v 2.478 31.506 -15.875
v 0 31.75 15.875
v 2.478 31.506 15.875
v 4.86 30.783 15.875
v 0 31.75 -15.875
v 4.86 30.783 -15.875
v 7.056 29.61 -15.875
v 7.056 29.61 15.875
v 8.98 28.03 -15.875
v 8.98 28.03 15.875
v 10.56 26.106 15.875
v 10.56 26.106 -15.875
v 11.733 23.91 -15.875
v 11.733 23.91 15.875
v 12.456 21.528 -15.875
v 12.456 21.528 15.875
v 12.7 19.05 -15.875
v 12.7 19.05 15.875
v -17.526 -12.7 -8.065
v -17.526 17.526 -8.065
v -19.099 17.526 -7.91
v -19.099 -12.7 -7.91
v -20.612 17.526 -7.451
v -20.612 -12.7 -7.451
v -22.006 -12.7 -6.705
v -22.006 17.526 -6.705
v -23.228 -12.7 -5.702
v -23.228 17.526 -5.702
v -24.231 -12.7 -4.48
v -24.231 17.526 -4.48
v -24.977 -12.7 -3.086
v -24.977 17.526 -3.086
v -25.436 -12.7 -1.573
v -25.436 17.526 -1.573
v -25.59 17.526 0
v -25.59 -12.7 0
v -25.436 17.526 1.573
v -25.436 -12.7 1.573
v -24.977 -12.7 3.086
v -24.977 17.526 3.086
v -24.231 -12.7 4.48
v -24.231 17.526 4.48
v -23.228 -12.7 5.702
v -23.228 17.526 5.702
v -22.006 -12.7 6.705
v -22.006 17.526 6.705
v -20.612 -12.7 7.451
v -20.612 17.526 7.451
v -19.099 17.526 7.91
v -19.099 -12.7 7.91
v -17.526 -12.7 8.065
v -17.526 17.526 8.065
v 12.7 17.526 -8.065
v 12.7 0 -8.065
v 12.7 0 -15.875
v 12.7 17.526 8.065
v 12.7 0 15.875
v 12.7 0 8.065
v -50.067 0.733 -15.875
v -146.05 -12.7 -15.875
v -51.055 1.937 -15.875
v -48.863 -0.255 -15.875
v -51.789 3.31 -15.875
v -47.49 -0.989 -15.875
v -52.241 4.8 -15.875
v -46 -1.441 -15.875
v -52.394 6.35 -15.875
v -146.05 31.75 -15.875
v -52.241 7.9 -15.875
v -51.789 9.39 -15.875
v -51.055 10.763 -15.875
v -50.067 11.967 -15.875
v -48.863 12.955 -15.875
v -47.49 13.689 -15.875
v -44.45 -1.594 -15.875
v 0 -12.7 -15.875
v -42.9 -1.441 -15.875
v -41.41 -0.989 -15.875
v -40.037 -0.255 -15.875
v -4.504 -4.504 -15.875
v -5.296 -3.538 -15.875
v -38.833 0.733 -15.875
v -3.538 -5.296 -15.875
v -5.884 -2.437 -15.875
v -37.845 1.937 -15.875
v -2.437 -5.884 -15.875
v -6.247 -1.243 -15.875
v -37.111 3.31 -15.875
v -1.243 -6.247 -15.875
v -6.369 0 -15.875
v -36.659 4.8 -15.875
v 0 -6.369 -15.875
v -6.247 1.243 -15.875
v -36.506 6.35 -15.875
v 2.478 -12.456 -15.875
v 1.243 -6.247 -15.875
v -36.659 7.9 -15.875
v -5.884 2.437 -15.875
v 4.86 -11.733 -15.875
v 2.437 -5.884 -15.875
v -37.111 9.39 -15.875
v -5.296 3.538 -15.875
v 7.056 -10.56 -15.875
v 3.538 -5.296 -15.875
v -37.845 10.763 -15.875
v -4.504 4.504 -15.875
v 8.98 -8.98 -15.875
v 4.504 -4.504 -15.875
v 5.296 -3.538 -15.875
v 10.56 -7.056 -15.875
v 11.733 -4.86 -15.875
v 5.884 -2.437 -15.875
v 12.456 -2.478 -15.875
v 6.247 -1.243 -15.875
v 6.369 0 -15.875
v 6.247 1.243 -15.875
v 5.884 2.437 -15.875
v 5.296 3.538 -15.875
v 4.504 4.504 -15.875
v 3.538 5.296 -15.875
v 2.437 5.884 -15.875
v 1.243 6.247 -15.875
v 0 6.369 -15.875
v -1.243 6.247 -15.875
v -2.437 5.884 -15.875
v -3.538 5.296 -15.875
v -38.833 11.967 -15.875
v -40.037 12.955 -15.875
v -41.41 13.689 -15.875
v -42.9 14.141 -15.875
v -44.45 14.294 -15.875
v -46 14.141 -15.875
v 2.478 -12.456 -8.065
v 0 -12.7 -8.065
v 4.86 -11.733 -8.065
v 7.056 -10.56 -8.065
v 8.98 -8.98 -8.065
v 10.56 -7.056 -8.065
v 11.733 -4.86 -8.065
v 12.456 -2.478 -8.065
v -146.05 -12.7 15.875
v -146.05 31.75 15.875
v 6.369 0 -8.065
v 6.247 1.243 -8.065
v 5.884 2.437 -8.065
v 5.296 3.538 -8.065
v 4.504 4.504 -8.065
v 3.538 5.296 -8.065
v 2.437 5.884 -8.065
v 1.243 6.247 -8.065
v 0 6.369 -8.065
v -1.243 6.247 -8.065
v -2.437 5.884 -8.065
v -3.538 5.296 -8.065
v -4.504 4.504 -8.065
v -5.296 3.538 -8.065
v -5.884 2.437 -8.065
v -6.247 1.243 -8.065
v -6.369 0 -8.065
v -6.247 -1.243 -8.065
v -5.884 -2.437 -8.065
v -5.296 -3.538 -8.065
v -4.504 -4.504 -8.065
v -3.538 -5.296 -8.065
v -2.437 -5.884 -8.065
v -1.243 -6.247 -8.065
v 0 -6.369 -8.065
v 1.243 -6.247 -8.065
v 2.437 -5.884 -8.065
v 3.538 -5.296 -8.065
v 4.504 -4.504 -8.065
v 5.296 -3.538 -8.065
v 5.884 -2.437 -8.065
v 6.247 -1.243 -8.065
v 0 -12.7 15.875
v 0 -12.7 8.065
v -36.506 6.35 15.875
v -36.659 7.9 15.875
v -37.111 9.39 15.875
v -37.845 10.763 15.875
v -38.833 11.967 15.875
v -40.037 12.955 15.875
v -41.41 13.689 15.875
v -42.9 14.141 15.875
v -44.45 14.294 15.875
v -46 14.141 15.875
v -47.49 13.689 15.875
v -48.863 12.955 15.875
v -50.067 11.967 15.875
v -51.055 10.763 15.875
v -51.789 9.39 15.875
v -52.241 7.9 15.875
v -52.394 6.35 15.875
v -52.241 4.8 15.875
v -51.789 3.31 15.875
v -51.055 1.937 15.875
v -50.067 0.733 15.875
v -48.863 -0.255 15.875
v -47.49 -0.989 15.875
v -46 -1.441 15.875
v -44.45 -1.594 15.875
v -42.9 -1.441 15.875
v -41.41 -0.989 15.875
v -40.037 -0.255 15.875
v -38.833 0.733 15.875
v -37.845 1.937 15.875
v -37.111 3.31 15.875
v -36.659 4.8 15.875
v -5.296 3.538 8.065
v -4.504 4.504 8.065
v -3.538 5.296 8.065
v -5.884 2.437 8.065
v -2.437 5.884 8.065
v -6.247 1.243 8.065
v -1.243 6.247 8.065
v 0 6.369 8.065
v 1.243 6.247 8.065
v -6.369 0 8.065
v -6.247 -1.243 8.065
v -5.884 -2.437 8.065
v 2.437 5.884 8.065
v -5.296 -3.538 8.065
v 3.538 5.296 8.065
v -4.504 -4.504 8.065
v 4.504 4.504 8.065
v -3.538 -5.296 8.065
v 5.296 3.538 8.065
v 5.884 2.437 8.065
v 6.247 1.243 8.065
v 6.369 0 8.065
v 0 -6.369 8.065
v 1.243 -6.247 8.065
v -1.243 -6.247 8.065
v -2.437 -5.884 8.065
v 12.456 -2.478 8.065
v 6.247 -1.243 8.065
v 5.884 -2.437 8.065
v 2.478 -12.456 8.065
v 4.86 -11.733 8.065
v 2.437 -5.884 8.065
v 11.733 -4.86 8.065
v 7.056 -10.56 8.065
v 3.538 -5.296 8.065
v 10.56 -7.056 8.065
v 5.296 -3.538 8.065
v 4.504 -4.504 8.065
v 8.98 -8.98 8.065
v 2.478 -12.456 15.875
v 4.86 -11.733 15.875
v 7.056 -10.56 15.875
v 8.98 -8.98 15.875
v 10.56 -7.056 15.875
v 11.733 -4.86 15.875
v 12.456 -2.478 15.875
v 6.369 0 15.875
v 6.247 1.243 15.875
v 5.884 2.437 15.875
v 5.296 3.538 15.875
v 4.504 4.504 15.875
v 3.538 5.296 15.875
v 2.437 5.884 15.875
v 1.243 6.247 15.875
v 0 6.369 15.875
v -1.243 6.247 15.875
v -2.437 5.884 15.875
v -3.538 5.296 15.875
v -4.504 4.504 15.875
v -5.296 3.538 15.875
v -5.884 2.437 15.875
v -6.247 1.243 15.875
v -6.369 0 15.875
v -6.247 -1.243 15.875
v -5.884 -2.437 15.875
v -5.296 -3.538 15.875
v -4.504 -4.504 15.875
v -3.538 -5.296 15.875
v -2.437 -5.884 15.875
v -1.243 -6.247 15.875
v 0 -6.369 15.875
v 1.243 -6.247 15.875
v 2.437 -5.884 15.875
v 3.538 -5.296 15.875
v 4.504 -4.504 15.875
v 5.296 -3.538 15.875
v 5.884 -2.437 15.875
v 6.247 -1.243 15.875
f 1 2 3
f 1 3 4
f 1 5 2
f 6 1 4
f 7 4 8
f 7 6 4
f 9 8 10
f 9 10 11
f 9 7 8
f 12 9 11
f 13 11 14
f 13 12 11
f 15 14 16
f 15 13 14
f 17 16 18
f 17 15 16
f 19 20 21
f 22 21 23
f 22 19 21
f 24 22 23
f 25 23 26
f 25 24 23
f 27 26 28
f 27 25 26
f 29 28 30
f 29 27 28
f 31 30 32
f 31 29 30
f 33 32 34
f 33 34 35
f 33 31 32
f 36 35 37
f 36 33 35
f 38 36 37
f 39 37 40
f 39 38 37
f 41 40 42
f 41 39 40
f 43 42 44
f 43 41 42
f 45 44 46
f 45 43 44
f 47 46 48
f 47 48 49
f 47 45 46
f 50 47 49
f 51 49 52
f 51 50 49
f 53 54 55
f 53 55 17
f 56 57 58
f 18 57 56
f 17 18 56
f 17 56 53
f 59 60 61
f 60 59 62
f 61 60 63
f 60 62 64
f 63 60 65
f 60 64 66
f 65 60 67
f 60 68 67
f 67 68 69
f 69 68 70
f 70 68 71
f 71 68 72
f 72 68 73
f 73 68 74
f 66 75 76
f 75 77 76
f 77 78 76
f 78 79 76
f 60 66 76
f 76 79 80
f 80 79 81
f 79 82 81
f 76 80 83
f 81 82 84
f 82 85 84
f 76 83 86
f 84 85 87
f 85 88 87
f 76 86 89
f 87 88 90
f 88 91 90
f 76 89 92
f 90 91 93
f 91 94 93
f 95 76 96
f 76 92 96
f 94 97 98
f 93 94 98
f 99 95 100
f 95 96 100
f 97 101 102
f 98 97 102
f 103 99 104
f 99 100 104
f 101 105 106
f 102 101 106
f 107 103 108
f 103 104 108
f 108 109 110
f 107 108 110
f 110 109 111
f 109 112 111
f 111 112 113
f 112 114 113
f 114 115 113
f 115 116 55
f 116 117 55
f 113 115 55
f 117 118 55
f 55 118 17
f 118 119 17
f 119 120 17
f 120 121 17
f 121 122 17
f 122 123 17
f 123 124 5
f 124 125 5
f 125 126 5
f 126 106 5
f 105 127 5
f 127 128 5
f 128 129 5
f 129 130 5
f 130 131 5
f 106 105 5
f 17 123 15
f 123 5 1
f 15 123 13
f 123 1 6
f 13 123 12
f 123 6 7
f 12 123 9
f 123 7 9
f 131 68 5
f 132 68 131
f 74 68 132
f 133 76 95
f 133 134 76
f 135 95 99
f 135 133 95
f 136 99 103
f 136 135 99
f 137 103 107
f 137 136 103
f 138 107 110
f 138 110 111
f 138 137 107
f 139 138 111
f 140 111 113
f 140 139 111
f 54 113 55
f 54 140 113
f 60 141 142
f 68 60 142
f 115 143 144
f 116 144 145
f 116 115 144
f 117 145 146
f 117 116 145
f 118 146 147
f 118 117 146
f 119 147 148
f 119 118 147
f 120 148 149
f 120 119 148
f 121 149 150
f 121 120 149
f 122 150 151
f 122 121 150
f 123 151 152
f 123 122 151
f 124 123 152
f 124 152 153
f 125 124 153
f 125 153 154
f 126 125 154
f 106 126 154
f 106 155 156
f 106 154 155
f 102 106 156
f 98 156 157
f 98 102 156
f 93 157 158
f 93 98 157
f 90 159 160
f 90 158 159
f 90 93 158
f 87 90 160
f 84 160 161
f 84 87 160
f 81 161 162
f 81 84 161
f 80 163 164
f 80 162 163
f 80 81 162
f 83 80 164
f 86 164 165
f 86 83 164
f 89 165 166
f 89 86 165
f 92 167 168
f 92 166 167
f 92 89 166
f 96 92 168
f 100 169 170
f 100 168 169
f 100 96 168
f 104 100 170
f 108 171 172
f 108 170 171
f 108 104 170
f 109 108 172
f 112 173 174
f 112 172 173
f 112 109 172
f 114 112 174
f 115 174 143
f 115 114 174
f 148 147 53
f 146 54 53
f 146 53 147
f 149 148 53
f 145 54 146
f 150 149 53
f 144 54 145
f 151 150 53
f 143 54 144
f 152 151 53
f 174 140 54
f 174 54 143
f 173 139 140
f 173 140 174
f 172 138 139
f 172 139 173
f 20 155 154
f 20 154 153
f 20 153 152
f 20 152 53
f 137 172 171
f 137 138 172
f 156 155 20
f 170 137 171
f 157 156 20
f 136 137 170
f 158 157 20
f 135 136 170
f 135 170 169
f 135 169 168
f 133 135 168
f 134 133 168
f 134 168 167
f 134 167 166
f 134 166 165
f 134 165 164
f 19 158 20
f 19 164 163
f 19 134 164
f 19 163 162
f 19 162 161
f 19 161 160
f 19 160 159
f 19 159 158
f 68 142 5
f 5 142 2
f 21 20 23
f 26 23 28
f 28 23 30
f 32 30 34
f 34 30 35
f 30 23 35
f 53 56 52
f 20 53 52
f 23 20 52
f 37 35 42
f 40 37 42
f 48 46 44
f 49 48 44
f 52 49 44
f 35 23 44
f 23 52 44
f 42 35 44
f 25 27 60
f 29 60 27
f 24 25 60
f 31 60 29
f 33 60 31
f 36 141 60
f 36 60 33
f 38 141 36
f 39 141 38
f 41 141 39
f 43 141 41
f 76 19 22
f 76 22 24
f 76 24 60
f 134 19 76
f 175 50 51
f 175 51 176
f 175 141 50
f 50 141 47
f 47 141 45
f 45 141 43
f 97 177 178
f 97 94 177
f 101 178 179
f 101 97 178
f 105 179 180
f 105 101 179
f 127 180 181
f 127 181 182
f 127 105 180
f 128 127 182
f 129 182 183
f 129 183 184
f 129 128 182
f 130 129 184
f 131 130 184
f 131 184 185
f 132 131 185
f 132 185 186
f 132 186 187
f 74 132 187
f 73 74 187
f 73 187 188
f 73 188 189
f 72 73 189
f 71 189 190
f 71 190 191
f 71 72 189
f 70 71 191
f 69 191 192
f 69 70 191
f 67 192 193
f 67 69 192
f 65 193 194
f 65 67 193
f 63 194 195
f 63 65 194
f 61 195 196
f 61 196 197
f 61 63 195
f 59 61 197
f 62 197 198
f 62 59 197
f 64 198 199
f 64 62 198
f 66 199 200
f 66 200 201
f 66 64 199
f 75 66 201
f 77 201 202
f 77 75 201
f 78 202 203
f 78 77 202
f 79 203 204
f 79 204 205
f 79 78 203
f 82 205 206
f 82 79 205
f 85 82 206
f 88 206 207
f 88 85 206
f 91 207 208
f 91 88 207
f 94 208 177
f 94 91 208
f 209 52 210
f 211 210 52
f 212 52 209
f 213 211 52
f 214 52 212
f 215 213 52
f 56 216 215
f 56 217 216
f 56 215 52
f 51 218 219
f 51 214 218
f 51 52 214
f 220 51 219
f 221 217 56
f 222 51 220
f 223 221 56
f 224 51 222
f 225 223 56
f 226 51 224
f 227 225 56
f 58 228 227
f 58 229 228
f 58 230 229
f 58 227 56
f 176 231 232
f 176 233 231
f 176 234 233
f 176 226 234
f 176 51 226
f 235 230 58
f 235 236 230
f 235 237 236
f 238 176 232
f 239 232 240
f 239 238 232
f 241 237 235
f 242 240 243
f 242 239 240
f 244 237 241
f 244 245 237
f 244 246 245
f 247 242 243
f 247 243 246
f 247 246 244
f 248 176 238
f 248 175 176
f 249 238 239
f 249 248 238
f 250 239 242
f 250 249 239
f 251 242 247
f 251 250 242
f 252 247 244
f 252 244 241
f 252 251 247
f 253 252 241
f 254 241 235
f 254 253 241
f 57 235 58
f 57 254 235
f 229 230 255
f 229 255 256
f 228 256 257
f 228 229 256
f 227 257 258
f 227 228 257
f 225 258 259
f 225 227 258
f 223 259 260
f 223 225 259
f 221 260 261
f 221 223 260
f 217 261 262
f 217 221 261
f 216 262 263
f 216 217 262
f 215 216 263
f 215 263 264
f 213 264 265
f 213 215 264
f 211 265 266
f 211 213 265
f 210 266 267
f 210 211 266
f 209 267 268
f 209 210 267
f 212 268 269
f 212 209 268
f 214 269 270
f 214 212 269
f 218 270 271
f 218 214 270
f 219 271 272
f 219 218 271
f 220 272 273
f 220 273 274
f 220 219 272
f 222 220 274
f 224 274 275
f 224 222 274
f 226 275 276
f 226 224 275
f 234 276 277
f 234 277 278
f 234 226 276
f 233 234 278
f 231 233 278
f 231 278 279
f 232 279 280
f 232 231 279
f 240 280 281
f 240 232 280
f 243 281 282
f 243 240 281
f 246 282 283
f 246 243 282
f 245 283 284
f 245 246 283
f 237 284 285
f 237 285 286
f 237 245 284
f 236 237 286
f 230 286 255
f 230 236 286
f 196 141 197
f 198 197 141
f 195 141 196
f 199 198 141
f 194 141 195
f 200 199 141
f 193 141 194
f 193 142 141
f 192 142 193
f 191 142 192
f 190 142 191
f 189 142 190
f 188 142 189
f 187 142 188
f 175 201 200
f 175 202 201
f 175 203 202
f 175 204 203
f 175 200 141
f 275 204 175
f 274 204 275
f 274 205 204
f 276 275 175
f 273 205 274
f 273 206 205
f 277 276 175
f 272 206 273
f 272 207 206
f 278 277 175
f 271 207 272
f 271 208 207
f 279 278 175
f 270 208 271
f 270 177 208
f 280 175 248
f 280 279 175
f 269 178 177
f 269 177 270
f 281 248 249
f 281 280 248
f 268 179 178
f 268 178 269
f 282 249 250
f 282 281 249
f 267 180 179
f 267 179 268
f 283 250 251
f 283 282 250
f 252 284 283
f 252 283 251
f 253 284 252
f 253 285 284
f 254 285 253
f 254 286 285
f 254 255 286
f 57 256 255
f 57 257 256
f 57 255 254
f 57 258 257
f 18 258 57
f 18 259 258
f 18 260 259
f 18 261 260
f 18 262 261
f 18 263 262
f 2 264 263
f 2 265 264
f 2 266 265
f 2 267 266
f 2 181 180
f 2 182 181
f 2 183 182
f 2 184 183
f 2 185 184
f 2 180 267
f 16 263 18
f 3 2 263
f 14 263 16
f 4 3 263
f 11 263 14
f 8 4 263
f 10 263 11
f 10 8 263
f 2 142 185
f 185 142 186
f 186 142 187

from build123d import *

# Parameters (mm, degrees)
SKETCH11_W         = 158.75
SKETCH11_H         = 44.45
SKETCH11_R         = 6.36905
SKETCH11_R_2       = 7.94385
EXTRUDE3_DEPTH     = 15.875
CUT_EXTRUDE1_DEPTH = 30.226
FILLET1_R          = 12.7


with BuildPart() as part:
    # Sketch11 → Extrude3 (new body, symmetric)
    with BuildSketch(Plane.XY):
        with Locations((-66.675, 9.525)):
            Rectangle(SKETCH11_W, SKETCH11_H)
        Circle(SKETCH11_R, mode=Mode.SUBTRACT)
        with Locations((-44.45, 6.35)):
            Circle(SKETCH11_R_2, mode=Mode.SUBTRACT)
    extrude(amount=EXTRUDE3_DEPTH, both=True)

    # Sketch12 → Cut-Extrude1 (cut)
    with BuildSketch(Plane.XZ.offset(12.7)):
        with BuildLine():
            Line((-17.526, 8.0645), (12.7, 8.0645))
            Line((12.7, 8.0645), (12.7, -8.0645))
            Line((12.7, -8.0645), (-17.526, -8.0645))
            ThreePointArc((-17.526, -8.0645), (-25.5905, 0), (-17.526, 8.0645))
        make_face()
    extrude(amount=-CUT_EXTRUDE1_DEPTH, mode=Mode.SUBTRACT)

    # Fillet1
    fillet1_edges = [part.edges().sort_by_distance(p)[0] for p in [
        (12.7, -12.7, -11.96975),
        (12.7, 31.75, 0),
        (12.7, -12.7, 11.96975),
    ]]
    fillet(fillet1_edges, radius=FILLET1_R)


solid = part.part
